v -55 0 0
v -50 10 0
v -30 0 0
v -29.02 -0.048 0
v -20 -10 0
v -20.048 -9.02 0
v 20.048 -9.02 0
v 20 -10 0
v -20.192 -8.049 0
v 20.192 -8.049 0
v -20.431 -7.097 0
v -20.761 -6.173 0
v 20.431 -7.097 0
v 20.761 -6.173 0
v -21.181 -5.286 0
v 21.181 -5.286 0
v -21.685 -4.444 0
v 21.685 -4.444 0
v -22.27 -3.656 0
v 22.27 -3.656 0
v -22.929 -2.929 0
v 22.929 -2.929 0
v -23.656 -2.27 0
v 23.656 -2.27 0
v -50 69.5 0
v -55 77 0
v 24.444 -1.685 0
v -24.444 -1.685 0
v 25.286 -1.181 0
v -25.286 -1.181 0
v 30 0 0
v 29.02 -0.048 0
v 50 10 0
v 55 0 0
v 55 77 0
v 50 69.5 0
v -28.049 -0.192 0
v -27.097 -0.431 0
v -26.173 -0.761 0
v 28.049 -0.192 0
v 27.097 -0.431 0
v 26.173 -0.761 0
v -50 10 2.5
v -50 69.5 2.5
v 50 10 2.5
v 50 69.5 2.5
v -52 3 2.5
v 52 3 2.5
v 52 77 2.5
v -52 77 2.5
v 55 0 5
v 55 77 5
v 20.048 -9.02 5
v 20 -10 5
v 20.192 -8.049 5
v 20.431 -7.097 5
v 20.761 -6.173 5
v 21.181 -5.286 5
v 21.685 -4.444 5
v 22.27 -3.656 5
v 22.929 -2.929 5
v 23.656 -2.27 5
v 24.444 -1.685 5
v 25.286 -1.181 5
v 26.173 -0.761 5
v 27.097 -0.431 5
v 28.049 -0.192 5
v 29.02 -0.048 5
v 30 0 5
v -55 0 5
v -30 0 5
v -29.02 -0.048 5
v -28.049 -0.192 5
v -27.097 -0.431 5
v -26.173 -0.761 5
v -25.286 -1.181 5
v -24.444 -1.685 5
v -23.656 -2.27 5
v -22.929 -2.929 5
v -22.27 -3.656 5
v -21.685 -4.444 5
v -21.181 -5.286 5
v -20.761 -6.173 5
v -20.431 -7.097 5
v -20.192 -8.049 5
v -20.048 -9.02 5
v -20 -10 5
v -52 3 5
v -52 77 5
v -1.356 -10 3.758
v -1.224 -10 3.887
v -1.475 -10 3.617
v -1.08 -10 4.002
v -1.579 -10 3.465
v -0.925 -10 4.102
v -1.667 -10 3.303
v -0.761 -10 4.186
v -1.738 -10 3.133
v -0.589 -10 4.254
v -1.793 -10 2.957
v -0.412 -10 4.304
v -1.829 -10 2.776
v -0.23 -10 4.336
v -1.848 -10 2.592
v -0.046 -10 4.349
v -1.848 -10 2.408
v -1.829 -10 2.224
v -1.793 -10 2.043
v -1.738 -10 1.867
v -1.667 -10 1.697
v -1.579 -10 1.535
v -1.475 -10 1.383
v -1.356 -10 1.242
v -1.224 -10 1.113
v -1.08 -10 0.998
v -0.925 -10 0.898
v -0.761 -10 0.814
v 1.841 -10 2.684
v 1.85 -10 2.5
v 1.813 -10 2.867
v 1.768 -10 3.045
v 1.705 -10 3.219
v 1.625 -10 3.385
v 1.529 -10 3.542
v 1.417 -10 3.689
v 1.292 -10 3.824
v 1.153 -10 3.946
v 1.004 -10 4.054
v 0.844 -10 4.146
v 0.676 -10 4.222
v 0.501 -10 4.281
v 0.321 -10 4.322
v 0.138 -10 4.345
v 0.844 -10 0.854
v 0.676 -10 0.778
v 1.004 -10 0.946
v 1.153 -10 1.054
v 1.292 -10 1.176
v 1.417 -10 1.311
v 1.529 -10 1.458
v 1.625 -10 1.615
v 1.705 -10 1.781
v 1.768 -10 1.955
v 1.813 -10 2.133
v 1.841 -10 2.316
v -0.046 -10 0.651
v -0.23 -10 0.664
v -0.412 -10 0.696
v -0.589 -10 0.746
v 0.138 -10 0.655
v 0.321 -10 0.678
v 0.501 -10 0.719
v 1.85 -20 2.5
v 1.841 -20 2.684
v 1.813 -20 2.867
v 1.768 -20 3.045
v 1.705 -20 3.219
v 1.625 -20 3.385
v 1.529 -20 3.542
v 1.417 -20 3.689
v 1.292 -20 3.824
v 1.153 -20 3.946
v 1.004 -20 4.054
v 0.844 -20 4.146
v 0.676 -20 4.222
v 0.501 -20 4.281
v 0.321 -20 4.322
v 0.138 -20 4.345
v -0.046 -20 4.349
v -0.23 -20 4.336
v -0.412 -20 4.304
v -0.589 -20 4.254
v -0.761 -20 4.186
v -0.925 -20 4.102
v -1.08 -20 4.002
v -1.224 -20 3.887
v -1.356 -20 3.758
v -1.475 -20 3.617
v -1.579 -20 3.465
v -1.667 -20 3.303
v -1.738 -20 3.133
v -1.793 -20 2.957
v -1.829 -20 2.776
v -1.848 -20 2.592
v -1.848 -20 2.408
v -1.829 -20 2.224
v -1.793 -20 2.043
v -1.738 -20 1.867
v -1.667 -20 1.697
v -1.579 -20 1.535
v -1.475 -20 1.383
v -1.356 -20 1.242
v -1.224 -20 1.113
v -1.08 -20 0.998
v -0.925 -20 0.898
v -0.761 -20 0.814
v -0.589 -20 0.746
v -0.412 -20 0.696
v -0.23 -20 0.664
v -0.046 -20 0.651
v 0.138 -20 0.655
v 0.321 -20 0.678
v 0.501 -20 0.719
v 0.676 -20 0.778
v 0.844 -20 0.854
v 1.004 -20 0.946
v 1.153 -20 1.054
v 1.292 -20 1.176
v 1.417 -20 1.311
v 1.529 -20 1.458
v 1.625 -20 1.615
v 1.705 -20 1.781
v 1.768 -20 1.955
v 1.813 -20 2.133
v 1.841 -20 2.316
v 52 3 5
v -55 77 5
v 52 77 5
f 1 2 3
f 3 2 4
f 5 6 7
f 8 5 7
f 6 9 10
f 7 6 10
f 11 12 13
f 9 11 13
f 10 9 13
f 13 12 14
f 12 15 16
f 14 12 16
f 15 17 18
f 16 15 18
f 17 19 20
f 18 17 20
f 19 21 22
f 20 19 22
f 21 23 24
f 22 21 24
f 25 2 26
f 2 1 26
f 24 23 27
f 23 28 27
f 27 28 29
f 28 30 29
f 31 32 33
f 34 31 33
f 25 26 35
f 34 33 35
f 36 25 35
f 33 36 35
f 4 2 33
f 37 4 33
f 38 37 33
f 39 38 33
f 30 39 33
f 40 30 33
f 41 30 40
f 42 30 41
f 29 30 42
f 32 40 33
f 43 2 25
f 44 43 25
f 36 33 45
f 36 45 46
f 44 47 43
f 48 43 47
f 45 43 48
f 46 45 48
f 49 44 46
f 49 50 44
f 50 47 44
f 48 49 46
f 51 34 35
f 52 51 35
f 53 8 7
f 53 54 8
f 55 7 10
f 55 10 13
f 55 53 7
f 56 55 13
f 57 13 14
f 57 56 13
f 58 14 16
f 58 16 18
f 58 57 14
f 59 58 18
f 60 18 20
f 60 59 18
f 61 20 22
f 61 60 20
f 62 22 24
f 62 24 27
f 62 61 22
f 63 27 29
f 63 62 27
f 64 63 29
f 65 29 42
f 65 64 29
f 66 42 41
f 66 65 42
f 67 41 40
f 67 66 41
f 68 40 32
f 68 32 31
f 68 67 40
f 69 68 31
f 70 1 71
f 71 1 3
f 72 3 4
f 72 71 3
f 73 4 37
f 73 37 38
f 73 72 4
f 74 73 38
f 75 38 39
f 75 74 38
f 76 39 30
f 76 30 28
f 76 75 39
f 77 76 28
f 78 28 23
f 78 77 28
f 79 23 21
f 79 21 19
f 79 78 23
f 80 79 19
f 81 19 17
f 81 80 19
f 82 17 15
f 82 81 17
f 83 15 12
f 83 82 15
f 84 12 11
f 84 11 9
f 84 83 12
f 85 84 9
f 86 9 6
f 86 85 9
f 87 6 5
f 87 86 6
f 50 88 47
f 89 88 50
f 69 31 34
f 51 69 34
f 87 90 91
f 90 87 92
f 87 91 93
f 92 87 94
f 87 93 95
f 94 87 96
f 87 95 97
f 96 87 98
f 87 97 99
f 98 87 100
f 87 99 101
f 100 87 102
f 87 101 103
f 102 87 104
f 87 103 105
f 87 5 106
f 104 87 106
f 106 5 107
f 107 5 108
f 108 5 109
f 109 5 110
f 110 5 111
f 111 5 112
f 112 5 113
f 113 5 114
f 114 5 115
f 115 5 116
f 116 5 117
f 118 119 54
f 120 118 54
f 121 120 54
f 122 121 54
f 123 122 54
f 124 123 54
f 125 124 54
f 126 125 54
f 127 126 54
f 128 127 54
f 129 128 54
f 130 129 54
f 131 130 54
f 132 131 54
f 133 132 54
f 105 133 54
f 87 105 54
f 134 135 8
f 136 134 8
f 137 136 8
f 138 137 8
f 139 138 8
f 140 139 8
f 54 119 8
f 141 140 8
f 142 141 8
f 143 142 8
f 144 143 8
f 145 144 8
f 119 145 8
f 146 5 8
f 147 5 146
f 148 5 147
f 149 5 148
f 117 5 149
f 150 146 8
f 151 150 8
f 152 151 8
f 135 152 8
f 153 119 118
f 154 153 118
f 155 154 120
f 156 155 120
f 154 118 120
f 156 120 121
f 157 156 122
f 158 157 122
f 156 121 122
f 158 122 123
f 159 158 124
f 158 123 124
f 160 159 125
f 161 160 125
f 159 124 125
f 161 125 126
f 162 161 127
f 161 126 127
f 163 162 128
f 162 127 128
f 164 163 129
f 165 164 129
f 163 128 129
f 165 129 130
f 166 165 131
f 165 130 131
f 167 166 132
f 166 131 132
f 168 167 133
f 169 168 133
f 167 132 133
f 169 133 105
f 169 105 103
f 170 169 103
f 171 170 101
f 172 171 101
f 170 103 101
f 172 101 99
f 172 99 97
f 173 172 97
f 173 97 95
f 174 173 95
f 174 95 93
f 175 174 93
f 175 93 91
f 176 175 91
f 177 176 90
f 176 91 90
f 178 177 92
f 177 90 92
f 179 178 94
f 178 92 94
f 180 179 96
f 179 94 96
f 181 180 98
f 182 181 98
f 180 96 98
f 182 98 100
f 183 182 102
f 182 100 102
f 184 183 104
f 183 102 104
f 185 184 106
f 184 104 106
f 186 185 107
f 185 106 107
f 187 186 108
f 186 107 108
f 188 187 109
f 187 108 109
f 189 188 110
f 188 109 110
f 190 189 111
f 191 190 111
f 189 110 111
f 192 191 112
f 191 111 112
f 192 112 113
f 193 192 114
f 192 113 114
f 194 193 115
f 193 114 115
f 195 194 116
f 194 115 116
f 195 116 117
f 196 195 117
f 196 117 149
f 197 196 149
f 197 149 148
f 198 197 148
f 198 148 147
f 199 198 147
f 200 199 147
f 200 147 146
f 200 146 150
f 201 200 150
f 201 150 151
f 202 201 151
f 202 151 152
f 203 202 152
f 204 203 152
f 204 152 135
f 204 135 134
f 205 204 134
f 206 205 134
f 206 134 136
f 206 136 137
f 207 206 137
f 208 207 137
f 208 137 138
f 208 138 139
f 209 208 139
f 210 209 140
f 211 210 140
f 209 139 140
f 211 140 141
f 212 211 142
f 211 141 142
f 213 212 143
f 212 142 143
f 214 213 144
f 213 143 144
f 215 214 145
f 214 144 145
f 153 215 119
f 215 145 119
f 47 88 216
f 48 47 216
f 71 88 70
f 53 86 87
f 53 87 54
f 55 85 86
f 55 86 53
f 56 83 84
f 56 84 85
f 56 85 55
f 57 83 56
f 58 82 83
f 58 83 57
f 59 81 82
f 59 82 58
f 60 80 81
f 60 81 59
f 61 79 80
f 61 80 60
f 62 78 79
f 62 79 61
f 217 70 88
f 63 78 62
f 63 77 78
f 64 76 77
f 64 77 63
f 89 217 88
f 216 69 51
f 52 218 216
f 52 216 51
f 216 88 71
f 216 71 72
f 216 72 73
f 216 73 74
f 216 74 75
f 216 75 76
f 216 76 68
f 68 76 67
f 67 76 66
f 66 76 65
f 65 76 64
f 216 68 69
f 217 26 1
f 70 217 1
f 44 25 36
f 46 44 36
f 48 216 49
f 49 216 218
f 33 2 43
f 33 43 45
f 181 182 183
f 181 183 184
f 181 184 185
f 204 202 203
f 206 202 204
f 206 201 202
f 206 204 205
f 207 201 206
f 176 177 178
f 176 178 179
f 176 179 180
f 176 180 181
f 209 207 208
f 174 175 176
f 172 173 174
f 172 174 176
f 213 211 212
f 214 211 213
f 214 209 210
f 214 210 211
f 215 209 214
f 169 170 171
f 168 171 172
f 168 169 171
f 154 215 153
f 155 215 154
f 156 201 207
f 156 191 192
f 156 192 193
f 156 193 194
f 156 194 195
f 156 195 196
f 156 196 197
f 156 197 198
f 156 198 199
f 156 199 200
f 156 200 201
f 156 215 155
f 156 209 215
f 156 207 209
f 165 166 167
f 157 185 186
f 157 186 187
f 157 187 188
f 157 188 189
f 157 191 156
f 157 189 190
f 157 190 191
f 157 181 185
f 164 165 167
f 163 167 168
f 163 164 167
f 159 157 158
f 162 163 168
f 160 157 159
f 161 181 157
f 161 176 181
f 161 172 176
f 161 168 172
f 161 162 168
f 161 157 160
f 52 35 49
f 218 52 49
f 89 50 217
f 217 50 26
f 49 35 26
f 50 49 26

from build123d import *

# Parameters (mm, degrees)
F0_W     = 100.0000001118
F0_H     = 59.5
F0_W_2   = 40
F0_H_2   = 10
F1_DEPTH = 5
F2_W     = 104
F2_H     = 74
F2_W_2   = 100.0000001118
F2_H_2   = 59.5
F3_DEPTH = 2.5
F4_R     = 1.85
F5_DEPTH = 10
F6_R     = 9.99999


# Not quite as in the source:
# - a fillet or chamfer is up to 0.001 mm smaller than in the source, because OpenCascade refuses the exact size


with BuildPart() as f1:
    # F0 (on Top) → F1 (new body)
    with BuildSketch(Plane.XY):
        Polygon((-55, 77), (-55, 0), (-20, 0), (20, 0), (55, 0), (55, 77), align=None)
        with Locations((5.59e-08, 39.75)):
            Rectangle(F0_W, F0_H, mode=Mode.SUBTRACT)
        with Locations((0, -5)):
            Rectangle(F0_W_2, F0_H_2)
    extrude(amount=F1_DEPTH)

    # F2 (on face) → F3 (cut)
    with BuildSketch(Plane.XY.offset(5)):
        with Locations((0, 40)):
            Rectangle(F2_W, F2_H)
        with Locations((5.59e-08, 39.75)):
            Rectangle(F2_W_2, F2_H_2, mode=Mode.SUBTRACT)
    extrude(amount=-F3_DEPTH, mode=Mode.SUBTRACT)

    # F4 (on face) → F5 (join)
    with BuildSketch(Plane.XZ.offset(10)):
        with Locations((0, 2.5)):
            Circle(F4_R)
    extrude(amount=F5_DEPTH)

    # F6 (radius 10 in the source; OpenCascade refuses exactly that, so slightly less here)
    f6_edges = [f1.edges().sort_by_distance(p)[0] for p in [
        (20, 0, 2.5),
        (-20, 0, 2.5),
    ]]
    fillet(f6_edges, radius=F6_R)


solid = f1.part
